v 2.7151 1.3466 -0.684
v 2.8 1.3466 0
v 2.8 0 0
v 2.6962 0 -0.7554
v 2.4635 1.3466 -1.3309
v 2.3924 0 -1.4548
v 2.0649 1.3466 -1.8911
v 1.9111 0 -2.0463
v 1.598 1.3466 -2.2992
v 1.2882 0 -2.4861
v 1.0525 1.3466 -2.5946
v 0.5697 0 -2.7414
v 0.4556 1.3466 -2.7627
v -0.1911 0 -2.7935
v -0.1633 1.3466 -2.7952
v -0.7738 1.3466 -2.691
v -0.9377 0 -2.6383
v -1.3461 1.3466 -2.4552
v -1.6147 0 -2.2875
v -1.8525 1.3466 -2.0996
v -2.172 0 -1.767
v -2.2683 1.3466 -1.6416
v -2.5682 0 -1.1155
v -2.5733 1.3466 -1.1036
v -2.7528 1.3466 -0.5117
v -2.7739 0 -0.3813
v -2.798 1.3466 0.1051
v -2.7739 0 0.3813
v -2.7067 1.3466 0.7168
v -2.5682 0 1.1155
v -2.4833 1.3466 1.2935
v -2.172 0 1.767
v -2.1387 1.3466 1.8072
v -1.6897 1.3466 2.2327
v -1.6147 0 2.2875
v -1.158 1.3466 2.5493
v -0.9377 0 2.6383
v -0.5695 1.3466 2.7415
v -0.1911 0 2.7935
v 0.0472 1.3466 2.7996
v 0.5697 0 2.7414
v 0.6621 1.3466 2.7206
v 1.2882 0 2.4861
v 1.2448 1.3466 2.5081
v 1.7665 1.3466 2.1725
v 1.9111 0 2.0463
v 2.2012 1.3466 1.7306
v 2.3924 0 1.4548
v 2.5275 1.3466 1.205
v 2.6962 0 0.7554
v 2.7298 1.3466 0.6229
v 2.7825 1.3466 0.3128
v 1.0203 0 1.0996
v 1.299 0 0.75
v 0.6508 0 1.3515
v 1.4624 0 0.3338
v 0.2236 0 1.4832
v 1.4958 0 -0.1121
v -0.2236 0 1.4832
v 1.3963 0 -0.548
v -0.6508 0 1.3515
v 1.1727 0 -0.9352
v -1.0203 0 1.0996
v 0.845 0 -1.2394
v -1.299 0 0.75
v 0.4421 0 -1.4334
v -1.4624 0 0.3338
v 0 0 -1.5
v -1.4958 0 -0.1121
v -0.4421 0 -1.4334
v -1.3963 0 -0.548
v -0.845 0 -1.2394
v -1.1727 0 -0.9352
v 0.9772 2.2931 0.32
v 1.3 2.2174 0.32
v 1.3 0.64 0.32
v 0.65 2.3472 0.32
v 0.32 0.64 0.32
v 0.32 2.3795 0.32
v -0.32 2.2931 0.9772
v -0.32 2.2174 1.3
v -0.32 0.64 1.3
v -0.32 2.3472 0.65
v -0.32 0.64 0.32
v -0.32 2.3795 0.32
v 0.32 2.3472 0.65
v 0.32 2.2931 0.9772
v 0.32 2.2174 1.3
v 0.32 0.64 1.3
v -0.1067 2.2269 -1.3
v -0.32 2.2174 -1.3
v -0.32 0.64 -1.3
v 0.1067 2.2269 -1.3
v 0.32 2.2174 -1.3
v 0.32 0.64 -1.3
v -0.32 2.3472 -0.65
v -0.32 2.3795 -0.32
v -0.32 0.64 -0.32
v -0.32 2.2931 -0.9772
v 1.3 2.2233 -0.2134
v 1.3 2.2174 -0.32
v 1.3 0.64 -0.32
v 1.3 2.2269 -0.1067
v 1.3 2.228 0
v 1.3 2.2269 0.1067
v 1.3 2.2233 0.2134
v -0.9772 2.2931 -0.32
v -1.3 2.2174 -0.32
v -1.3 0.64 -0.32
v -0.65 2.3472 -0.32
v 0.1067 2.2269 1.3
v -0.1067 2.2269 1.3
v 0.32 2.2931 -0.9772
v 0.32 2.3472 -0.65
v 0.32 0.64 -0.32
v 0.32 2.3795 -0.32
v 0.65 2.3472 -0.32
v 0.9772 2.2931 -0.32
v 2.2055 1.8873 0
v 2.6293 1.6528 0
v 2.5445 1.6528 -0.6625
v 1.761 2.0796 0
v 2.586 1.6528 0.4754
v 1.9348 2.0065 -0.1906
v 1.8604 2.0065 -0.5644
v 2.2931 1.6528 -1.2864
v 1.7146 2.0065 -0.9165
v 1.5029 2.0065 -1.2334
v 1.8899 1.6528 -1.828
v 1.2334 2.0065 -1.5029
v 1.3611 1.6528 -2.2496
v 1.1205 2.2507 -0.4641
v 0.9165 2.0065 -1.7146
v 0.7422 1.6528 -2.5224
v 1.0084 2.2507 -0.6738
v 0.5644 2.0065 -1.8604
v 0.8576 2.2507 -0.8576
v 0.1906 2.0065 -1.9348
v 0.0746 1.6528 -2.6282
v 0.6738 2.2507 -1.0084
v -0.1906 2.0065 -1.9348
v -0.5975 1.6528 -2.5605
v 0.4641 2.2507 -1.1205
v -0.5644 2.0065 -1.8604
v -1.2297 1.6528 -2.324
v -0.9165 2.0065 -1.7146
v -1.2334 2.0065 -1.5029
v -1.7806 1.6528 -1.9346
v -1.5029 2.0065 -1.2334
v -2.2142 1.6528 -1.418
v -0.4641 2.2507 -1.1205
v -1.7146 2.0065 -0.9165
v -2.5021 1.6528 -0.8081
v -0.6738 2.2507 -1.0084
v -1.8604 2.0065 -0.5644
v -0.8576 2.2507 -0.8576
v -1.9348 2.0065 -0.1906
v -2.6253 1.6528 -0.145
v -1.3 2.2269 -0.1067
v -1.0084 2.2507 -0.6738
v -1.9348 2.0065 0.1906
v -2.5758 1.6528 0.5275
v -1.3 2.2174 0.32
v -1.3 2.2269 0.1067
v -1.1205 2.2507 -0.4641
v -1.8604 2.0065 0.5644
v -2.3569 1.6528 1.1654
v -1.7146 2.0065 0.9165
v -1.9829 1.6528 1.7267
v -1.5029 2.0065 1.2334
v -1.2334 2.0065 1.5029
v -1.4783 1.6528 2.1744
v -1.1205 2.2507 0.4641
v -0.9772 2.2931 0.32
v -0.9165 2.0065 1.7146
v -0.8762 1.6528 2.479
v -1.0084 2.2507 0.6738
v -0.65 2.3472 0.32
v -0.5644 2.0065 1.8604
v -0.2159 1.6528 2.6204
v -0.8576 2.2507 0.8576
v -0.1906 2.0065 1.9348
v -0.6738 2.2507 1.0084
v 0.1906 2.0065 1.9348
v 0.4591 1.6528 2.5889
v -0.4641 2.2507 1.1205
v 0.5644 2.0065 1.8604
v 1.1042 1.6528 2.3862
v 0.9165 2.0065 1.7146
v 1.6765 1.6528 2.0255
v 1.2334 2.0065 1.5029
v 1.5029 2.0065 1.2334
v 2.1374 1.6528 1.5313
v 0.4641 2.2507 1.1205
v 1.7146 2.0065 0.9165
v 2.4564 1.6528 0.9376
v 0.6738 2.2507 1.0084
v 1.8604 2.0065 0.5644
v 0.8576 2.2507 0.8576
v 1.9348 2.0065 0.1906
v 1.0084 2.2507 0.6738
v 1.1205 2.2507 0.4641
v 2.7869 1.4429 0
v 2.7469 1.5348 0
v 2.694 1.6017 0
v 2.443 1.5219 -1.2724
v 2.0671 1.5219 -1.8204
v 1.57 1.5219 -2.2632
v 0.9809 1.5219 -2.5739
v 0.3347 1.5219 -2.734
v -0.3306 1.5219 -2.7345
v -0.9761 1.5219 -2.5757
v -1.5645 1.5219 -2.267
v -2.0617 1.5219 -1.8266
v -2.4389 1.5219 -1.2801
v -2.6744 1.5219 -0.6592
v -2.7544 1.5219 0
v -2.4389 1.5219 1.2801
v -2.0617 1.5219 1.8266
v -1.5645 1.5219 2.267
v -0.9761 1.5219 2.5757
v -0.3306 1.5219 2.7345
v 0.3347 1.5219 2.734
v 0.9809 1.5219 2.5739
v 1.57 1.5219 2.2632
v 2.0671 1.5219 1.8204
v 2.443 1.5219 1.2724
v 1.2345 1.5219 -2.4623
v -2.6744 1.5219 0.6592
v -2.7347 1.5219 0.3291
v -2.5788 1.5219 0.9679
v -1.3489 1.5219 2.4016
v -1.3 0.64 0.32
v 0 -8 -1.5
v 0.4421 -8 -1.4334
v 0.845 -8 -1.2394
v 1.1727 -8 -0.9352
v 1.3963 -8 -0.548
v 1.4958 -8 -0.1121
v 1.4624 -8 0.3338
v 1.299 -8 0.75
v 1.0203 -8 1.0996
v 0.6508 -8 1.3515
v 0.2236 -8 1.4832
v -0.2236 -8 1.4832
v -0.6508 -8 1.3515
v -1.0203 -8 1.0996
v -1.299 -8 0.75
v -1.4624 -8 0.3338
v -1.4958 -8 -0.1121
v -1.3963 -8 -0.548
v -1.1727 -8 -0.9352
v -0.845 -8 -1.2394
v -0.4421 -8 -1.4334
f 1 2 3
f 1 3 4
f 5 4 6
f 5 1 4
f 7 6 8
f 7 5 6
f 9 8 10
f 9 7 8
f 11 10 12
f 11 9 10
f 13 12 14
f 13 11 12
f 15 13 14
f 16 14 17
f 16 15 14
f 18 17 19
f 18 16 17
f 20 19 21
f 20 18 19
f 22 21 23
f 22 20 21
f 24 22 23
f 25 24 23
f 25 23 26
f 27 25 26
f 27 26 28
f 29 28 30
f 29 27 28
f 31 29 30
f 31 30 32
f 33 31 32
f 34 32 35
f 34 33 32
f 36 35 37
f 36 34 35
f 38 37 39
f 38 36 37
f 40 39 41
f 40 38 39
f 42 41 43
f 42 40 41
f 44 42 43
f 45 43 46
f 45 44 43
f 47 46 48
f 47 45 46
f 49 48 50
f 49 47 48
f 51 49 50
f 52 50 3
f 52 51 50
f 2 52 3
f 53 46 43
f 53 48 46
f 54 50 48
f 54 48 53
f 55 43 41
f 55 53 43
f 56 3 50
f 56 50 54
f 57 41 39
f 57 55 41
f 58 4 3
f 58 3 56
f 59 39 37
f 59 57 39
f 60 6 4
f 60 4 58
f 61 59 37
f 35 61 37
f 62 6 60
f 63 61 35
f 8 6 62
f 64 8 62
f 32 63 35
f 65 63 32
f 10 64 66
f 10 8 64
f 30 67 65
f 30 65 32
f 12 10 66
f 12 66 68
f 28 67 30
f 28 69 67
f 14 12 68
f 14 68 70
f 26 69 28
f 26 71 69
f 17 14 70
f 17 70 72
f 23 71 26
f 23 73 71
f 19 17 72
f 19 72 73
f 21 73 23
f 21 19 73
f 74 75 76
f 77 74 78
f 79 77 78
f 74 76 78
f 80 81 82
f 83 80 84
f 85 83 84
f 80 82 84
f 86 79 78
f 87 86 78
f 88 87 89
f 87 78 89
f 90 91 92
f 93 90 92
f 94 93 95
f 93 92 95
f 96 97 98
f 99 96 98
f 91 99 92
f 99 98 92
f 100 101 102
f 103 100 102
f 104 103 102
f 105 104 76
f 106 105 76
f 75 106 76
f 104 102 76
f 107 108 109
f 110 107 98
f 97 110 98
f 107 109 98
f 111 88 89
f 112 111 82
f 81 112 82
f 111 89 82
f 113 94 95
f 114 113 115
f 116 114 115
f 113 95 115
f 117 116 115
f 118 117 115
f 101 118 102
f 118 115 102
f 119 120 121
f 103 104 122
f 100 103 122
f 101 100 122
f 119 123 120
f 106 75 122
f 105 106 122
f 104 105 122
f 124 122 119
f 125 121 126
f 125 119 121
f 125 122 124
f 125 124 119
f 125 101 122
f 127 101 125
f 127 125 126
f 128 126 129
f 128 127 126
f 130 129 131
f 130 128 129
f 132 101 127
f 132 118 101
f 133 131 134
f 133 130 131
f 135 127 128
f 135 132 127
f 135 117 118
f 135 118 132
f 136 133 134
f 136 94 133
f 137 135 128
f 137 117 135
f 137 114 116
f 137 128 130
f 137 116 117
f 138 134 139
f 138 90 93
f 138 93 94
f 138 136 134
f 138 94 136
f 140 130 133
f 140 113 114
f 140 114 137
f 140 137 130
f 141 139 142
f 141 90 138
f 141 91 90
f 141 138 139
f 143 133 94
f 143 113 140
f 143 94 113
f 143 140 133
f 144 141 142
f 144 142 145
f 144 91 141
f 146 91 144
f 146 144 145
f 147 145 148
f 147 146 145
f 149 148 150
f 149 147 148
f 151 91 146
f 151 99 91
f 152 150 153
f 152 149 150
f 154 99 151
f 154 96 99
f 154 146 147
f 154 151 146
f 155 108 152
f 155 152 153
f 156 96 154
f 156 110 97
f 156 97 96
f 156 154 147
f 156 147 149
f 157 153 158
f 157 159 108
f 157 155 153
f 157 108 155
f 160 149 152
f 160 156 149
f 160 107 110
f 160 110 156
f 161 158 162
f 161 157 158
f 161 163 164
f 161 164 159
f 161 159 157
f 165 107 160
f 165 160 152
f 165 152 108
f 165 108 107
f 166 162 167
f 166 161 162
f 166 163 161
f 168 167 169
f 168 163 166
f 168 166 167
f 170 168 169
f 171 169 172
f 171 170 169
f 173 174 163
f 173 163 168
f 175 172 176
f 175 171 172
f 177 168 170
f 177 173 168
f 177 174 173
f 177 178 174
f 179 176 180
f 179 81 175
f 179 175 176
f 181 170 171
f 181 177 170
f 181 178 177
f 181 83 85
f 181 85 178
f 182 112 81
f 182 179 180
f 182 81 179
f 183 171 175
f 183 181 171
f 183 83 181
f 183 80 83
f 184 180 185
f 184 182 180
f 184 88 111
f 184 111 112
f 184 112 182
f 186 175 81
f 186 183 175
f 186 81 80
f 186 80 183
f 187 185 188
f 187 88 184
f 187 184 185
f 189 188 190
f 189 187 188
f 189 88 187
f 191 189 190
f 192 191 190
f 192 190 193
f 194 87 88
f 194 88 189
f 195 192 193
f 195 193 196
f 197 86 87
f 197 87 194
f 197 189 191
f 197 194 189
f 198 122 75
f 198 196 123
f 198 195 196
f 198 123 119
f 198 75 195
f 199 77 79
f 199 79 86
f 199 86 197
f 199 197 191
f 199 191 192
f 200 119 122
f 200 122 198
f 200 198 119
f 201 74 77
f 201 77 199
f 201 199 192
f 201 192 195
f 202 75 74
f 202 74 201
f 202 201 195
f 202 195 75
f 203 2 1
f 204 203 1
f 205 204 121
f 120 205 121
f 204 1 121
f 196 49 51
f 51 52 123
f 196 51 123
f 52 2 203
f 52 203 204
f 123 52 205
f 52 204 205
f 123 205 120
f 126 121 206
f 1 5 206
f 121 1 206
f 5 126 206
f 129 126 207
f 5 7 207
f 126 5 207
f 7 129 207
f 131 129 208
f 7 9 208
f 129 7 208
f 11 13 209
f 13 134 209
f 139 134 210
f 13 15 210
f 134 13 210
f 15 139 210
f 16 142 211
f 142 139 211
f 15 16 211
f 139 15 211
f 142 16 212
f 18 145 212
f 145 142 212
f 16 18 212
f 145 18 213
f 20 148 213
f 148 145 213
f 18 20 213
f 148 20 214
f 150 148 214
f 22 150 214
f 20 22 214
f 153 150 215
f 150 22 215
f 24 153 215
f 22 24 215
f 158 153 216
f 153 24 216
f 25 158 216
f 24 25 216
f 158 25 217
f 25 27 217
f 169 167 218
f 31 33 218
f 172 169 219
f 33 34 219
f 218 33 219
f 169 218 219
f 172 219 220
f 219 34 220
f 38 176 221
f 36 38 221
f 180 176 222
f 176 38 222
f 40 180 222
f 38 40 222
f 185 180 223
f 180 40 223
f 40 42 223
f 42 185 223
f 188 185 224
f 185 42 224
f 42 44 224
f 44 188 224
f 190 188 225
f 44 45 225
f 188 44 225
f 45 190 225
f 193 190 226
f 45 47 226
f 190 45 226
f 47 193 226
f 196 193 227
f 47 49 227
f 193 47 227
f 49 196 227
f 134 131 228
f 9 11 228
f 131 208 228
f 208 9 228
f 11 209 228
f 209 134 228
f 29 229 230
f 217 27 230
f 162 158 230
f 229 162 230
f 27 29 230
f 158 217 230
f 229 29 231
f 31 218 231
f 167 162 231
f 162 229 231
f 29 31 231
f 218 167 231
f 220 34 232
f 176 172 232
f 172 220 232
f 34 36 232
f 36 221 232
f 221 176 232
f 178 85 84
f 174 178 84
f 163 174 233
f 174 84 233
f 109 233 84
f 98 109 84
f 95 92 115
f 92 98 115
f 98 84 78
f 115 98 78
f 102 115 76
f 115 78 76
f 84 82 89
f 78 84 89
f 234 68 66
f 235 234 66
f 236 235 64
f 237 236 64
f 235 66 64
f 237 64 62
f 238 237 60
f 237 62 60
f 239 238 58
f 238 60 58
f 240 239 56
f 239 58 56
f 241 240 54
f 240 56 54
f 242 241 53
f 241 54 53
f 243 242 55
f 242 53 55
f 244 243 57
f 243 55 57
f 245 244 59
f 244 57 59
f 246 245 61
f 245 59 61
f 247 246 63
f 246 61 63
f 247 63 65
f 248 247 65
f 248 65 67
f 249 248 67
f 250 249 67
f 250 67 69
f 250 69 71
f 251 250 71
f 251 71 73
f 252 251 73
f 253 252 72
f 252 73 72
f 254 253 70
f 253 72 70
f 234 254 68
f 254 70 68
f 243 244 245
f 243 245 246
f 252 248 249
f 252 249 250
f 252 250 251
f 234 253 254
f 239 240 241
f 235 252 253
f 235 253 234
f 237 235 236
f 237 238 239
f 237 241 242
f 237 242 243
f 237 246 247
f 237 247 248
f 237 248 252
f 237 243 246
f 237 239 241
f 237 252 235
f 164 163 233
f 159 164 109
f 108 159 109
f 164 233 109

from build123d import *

# Parameters (mm, degrees)
SKETCH2_R           = 1.5
BOSS_EXTRUDE2_DEPTH = 8
CUT_EXTRUDE1_REACH  = 11.504
FILLET1_R           = 0.36


with BuildPart() as part:
    # Boss-Extrude1: read off the stored shape, not the designer's step
    # Boss-Extrude1 outline → Boss-Extrude1 (revolve)
    with BuildSketch(Plane.XY):
        with BuildLine():
            Line((2.8, 0), (2.8, 1.542463035))
            ThreePointArc((2.8, 1.542463035), (1.464186604, 2.180811394), (0, 2.4))
            Line((0, 2.4), (0, 0))
            Line((0, 0), (2.8, 0))
        make_face()
    revolve(axis=Axis((0, 0, 0), (0, 1, 0)))

    # Sketch2 → Boss-Extrude2 (add)
    with BuildSketch(Plane.XZ):
        with Locations(Location((0, 0, 0), (0, 0, 270))):
            Circle(SKETCH2_R)
    extrude(amount=BOSS_EXTRUDE2_DEPTH)

    # Sketch3 → Cut-Extrude1 (cut, up to next)
    with BuildSketch(Plane.XZ.offset(-0.64), mode=Mode.PRIVATE) as cut_extrude1_sk1:
        Polygon((-0.32, -1.3), (0.32, -1.3), (0.32, -0.32), (1.3, -0.32), (1.3, 0.32), (0.32, 0.32), (0.32, 1.3), (-0.32, 1.3), (-0.32, 0.32), (-1.3, 0.32), (-1.3, -0.32), (-0.32, -0.32), align=None)
    cut_extrude1_tool1 = extrude(cut_extrude1_sk1.sketch, amount=-CUT_EXTRUDE1_REACH, mode=Mode.PRIVATE) & part.part
    add(cut_extrude1_tool1.solids().sort_by_distance((0, 0.64, 0))[0], mode=Mode.SUBTRACT)

    # Fillet1
    fillet1_edges = [part.edges().sort_by_distance(p)[0] for p in [
        (-2.8, 1.542463035, 0),
    ]]
    fillet(fillet1_edges, radius=FILLET1_R)


solid = part.part
